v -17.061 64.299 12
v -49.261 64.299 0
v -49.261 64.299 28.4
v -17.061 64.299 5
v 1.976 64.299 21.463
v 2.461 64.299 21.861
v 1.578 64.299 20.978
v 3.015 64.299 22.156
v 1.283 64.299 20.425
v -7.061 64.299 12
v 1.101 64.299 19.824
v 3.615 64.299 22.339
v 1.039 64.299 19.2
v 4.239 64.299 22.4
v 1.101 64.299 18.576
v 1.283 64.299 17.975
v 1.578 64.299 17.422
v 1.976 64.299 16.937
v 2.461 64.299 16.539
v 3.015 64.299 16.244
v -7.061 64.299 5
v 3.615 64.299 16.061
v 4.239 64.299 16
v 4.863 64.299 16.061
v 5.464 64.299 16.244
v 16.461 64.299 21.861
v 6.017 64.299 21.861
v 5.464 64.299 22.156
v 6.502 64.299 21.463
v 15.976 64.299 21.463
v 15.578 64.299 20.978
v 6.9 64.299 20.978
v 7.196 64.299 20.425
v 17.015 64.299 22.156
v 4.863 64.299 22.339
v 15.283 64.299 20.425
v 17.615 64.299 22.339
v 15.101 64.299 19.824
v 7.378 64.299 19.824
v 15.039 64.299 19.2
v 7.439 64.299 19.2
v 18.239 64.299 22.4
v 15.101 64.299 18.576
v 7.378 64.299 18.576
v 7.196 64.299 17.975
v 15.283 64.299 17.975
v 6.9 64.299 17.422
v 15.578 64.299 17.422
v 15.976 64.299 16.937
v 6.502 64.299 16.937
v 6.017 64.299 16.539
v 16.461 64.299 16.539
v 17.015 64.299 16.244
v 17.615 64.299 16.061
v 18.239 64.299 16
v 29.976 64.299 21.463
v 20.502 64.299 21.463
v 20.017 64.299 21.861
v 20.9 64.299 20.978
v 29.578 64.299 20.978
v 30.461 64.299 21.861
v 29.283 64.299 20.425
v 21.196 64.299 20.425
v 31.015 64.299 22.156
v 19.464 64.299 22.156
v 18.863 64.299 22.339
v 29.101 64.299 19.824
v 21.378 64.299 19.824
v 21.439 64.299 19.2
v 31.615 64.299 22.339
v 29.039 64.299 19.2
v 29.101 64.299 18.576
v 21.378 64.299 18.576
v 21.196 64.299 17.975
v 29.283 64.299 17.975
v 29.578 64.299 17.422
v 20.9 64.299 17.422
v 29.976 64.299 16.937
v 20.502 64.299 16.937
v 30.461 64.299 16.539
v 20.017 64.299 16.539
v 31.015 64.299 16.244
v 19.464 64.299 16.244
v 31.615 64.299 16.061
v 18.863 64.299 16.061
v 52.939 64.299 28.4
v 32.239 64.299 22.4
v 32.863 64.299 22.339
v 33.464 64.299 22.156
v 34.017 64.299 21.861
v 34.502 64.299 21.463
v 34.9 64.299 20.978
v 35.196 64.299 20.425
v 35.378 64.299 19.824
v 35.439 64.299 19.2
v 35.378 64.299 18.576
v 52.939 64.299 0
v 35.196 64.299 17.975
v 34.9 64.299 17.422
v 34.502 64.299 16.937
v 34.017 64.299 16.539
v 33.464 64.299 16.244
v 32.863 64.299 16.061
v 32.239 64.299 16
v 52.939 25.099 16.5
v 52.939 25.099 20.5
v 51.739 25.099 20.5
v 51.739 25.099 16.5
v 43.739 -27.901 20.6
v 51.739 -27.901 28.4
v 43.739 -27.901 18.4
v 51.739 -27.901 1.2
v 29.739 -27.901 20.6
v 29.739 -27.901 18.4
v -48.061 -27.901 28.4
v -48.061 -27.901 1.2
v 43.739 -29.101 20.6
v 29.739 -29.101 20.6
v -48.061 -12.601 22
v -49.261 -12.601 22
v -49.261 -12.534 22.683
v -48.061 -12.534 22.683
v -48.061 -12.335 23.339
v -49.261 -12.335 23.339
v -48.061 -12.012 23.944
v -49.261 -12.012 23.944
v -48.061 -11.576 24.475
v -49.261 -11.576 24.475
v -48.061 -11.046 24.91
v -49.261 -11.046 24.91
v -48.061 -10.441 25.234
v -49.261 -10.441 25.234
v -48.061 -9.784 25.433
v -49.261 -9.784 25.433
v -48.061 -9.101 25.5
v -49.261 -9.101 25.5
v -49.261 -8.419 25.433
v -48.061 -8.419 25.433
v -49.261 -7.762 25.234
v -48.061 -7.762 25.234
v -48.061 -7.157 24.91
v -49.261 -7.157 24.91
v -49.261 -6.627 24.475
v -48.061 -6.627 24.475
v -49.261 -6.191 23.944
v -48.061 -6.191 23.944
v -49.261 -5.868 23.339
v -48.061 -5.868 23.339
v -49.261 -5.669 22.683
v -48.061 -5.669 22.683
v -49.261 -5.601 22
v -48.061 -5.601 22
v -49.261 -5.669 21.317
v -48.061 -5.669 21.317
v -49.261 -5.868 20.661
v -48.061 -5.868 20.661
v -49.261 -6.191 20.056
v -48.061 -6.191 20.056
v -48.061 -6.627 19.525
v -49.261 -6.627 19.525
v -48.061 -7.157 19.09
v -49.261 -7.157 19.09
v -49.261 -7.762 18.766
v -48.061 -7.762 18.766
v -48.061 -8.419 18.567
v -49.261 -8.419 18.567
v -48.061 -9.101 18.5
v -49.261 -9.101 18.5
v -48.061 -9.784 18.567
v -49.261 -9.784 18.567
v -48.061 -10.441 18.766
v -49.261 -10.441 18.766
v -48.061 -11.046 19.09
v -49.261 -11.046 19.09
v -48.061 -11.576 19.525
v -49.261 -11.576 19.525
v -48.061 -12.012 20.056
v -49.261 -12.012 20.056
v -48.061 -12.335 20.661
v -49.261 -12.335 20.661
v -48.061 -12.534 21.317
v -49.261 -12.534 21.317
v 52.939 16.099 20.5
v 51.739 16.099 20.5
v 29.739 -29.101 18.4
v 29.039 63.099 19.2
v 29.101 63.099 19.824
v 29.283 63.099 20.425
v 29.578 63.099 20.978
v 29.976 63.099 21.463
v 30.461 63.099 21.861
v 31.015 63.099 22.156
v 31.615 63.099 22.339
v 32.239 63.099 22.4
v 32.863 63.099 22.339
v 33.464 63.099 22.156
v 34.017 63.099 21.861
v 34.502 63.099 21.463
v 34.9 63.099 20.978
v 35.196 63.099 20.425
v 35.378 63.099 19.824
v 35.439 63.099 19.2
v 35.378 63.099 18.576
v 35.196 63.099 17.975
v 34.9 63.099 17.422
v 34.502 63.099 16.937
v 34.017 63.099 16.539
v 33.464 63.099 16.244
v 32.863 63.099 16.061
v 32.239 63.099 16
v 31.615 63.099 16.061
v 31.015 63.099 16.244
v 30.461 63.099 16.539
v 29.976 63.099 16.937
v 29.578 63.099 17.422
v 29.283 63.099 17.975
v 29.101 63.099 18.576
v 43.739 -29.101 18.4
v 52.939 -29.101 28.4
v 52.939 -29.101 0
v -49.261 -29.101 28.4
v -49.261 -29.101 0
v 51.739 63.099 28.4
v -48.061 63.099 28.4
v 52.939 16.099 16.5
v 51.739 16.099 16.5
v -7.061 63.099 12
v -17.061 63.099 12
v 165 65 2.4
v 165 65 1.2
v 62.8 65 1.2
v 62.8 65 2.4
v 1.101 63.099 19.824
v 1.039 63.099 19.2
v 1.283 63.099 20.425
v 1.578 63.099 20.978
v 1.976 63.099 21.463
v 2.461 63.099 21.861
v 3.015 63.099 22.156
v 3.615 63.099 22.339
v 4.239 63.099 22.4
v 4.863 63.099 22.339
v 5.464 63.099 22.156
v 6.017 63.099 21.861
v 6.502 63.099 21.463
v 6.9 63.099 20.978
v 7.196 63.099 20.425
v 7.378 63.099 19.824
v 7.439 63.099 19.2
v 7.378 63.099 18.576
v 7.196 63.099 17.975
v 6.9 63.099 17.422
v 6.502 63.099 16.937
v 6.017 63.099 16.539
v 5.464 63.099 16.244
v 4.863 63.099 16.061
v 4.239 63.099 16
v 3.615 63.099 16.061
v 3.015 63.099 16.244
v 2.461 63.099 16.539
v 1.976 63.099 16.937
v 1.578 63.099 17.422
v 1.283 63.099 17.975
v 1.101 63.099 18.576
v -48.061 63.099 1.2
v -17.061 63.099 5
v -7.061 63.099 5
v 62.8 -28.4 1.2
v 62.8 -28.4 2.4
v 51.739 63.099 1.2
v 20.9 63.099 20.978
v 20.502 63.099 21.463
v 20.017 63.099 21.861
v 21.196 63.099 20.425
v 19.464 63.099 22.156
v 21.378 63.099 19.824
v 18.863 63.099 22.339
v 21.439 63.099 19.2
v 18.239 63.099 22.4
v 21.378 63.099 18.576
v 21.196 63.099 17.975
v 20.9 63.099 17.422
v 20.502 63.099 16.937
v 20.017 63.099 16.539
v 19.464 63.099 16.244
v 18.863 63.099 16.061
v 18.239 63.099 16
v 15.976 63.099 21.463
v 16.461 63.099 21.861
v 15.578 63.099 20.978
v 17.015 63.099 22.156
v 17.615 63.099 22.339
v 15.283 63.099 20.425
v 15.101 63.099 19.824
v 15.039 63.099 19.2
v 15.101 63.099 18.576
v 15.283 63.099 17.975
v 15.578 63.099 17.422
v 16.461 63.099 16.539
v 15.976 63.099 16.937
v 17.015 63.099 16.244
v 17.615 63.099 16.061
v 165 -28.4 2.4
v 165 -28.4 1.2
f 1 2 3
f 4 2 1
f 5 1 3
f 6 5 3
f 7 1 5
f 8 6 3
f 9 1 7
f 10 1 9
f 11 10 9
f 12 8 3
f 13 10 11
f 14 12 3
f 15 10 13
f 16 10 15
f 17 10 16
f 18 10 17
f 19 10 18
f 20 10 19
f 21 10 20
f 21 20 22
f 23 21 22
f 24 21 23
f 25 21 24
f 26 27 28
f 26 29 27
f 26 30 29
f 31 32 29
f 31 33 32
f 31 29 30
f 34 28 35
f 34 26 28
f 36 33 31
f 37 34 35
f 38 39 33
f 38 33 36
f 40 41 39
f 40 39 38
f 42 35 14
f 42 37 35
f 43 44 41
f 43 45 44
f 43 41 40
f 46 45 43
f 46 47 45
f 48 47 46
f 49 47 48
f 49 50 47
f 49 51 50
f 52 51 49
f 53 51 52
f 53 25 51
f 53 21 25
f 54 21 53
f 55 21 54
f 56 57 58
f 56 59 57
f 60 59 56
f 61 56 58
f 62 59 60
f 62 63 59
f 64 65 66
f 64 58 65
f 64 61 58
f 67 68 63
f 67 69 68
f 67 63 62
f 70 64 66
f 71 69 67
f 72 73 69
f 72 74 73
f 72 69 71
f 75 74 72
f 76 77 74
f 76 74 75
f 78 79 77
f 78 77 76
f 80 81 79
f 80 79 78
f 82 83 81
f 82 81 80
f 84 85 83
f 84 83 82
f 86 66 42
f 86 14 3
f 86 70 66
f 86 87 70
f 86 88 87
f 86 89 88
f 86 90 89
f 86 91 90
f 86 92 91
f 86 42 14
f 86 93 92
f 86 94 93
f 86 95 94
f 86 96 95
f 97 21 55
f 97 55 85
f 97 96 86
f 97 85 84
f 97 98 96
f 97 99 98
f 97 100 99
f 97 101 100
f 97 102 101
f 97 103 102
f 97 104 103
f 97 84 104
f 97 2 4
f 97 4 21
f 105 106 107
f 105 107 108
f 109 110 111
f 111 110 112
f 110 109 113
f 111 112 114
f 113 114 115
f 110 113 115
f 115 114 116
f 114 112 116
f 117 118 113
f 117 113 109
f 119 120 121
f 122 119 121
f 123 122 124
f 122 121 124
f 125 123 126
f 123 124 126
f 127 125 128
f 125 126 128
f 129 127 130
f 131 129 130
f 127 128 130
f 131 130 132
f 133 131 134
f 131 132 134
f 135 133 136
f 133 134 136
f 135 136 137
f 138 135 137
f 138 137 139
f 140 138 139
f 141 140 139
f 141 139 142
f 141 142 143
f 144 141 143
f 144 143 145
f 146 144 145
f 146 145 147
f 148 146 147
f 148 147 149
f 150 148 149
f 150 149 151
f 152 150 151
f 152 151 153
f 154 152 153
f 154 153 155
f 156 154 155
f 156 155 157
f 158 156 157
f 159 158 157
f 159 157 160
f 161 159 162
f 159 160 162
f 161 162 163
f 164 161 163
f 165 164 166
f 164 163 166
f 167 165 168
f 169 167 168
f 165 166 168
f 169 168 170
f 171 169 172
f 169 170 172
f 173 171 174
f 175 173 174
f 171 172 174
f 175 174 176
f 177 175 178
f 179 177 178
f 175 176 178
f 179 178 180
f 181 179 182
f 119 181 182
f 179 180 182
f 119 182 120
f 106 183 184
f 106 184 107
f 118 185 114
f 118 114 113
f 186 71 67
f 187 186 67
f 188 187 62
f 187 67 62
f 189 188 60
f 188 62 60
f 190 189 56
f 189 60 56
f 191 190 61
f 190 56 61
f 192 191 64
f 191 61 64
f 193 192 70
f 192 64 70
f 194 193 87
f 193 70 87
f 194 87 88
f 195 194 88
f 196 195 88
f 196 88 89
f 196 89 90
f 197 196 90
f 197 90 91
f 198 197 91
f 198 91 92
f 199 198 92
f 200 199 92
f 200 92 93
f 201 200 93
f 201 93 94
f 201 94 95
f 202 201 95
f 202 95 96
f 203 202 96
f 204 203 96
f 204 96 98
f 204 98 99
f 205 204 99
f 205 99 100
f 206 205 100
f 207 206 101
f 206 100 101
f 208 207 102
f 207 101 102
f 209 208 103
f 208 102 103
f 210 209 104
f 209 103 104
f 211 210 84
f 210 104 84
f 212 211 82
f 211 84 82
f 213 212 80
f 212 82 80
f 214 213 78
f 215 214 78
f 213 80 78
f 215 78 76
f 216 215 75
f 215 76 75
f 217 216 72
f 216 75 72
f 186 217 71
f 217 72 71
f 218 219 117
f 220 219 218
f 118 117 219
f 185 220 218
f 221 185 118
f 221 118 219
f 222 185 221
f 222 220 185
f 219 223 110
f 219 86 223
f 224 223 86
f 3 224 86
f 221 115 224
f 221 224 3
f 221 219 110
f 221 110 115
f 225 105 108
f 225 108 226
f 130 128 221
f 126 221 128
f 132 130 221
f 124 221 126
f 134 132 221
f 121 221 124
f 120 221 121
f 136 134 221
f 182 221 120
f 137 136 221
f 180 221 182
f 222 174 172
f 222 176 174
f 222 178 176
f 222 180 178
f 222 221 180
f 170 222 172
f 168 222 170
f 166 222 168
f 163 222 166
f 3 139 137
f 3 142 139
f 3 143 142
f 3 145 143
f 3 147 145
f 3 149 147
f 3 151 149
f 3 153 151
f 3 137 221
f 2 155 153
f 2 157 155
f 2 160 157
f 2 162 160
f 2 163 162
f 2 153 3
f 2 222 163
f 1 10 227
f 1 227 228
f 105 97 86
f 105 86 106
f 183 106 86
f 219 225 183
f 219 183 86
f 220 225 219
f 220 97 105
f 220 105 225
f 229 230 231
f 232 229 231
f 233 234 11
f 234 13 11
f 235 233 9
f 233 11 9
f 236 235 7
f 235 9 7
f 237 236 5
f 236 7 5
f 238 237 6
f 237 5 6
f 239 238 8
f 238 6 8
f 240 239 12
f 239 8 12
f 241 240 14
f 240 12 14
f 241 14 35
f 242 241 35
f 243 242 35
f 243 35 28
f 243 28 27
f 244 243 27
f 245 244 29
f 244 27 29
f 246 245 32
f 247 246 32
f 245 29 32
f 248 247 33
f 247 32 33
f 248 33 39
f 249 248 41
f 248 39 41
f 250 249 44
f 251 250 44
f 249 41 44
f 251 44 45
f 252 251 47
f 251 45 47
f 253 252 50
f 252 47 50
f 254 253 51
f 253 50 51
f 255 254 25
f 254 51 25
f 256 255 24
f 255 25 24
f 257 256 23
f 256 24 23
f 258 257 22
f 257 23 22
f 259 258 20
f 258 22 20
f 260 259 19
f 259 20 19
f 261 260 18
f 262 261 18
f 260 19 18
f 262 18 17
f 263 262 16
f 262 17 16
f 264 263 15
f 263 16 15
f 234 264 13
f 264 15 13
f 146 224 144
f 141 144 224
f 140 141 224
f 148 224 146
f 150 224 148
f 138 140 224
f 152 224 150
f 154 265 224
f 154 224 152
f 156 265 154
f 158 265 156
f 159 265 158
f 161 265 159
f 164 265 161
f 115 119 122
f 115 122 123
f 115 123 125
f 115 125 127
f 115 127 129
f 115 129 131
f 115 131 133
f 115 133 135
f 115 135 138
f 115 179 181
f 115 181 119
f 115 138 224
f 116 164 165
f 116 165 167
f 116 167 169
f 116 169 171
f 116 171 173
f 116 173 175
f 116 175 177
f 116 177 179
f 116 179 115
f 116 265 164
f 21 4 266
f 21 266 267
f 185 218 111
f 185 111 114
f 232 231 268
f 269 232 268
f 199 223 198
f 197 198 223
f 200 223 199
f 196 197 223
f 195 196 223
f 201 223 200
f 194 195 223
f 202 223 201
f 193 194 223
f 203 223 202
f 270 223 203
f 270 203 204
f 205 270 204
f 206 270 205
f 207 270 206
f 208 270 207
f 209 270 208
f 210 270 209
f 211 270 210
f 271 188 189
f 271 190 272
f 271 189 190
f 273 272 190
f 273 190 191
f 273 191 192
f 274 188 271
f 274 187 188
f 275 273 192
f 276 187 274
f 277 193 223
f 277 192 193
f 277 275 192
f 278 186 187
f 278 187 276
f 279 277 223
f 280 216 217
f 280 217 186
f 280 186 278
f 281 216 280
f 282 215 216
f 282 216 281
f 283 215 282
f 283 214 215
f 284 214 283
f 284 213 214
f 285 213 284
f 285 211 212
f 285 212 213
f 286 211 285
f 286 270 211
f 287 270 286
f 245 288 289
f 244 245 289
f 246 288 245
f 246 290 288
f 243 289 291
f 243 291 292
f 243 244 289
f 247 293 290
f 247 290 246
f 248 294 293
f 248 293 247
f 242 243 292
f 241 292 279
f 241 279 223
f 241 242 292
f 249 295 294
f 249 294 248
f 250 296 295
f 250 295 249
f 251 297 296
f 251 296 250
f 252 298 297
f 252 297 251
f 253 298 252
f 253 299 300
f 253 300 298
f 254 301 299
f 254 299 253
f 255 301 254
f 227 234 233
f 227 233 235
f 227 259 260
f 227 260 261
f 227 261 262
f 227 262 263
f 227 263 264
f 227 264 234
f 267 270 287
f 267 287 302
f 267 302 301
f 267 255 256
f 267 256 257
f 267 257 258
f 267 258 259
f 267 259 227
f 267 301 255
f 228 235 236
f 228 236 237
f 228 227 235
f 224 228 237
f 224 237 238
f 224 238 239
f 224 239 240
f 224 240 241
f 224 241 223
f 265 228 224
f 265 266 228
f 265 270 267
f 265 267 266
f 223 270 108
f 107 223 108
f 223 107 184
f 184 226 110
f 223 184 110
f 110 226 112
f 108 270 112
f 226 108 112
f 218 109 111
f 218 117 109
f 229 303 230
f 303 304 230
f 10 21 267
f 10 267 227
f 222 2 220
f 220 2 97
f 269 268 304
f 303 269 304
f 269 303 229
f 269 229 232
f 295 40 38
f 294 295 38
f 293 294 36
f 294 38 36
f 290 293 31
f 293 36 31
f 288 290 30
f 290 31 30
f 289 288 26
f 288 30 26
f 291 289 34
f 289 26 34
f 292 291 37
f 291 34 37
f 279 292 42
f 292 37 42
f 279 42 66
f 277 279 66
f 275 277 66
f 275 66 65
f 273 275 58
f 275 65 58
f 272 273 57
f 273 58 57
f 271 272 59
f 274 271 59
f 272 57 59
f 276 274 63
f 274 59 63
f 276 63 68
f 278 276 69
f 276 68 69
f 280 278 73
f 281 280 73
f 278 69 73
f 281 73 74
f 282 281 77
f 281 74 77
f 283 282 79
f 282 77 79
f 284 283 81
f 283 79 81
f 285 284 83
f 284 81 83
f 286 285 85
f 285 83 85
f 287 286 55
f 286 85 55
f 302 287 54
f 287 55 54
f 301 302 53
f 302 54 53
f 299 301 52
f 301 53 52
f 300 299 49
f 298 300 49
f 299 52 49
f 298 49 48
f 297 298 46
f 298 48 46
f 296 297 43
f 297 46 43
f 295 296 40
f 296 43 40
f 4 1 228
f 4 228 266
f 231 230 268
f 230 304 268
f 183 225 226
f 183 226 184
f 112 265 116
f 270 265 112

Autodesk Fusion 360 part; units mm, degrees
sketch "Sketch1" plane through (0, 0, 0) normal (0, 0, 1) x (1, 0, 0)
  line L0 (-49.2609, 64.2986) -> (52.9391, 64.2986)
  line L1 (52.9391, 64.2986) -> (52.9391, -29.1014)
  line L2 (52.9391, -29.1014) -> (-49.2609, -29.1014)
  line L3 (-49.2609, -29.1014) -> (-49.2609, 64.2986)
  dimension "d1" = 102.2
  dimension "d2" = 93.4
extrude "Extrude1" add sketch "Sketch1" along normal blind 1.2 makes body 1
sketch "Sketch2" plane through (0, 0, 1.2) normal (0, 0, 1) x (-1, 0, 0)
  line L0 (49.2609, 29.1014) -> (-52.9391, 29.1014)
  line L1 (-52.9391, 29.1014) -> (-52.9391, -64.2986)
  line L2 (-52.9391, -64.2986) -> (49.2609, -64.2986)
  line L3 (49.2609, -64.2986) -> (49.2609, 29.1014)
  line L4 (49.2609, -64.2986) -> (-52.9391, -64.2986)
  line L5 (-52.9391, -64.2986) -> (-52.9391, -63.0986)
  line L6 (-52.9391, -63.0986) -> (49.2609, -63.0986)
  line L7 (49.2609, -63.0986) -> (49.2609, -64.2986)
  line L8 (49.2609, -64.2986) -> (48.0609, -64.2986)
  line L9 (48.0609, -64.2986) -> (48.0609, 29.1014)
  line L10 (48.0609, 29.1014) -> (49.2609, 29.1014)
  line L11 (49.2609, 29.1014) -> (49.2609, -64.2986)
  line L12 (-52.9391, -64.2986) -> (-51.7391, -64.2986)
  line L13 (-51.7391, -64.2986) -> (-51.7391, 29.1014)
  line L14 (-51.7391, 29.1014) -> (-52.9391, 29.1014)
  line L15 (-52.9391, 29.1014) -> (-52.9391, -64.2986)
  line L16 (49.2609, 29.1014) -> (-52.9391, 29.1014)
  line L17 (-52.9391, 29.1014) -> (-52.9391, 27.9014)
  line L18 (-52.9391, 27.9014) -> (49.2609, 27.9014)
  line L19 (49.2609, 27.9014) -> (49.2609, 29.1014)
  dimension "d5" = 1.2
  dimension "d6" = 1.2
  dimension "d7" = 1.2
  dimension "d8" = 1.2
extrude "Extrude2" add sketch "Sketch2" along normal blind 27.2 contours L0 L3 L9 L10 L11 L16 L18 L19 | L0 L9 L13 L16 L18 | L3 L6 L9 L11 L18 | L0 L1 L13 L14 L15 L16 L17 L18 | L2 L3 L4 L6 L7 L8 L9 L11 | L1 L6 L13 L15 L18 | L2 L4 L6 L9 L13 | L1 L2 L4 L5 L6 L12 L13 L15 bodies 1
sketch "Sketch3" plane through (0, 0, 1.2) normal (0, 0, 1) x (-1, 0, 0)
  line L0 (48.0609, 27.9014) -> (-51.7391, 27.9014)
  line L1 (-51.7391, 27.9014) -> (-51.7391, -63.0986)
  line L2 (-51.7391, -63.0986) -> (48.0609, -63.0986)
  line L3 (48.0609, -63.0986) -> (48.0609, 27.9014)
  line L4 (-165, -65) -> (-62.8, -65)
  line L5 (-62.8, -65) -> (-62.8, 28.4)
  line L6 (-62.8, 28.4) -> (-165, 28.4)
  line L7 (-165, 28.4) -> (-165, -65)
  dimension "d11" = 102.2
  dimension "d12" = 93.4
extrude "Extrude3" add sketch "Sketch3" along normal blind 1.2 separate body contours L4 L5 L6 L7 makes body 2
sketch "Sketch4" plane through (0, -29.1014, 0) normal (0, -1, 0) x (1, 0, 0)
  line L0 (-49.2609, 0) -> (52.9391, 0)
  line L1 (52.9391, 0) -> (52.9391, 28.4)
  line L2 (52.9391, 28.4) -> (-49.2609, 28.4)
  line L3 (-49.2609, 28.4) -> (-49.2609, 0)
  line L4 (29.7391, 20.6) -> (43.7391, 20.6)
  line L5 (43.7391, 20.6) -> (43.7391, 18.4)
  line L6 (43.7391, 18.4) -> (29.7391, 18.4)
  line L7 (29.7391, 18.4) -> (29.7391, 20.6)
  dimension "d15" = 18.4
  dimension "d16" = 9.2
  dimension "d17" = 14
  dimension "d18" = 2.2
extrude "Extrude4" cut sketch "Sketch4" against normal blind 4 contours L4 L5 L6 L7 bodies 1
sketch "Sketch5" plane through (0, 64.2986, 0) normal (0, 1, 0) x (-1, 0, 0)
  line L0 (-52.9391, 0) -> (49.2609, 0)
  line L1 (49.2609, 0) -> (49.2609, 28.4)
  line L2 (49.2609, 28.4) -> (-52.9391, 28.4)
  line L3 (-52.9391, 28.4) -> (-52.9391, 0)
  circle A0 centre (-32.2391, 19.2) radius 3.2
  line L4 (-51.7391, 1.2) -> (-51.7391, 28.4)
  line L5 (7.0609, 12) -> (17.0609, 12)
  line L6 (17.0609, 12) -> (17.0609, 5)
  line L7 (17.0609, 5) -> (7.0609, 5)
  line L8 (7.0609, 5) -> (7.0609, 12)
  circle A1 centre (-18.2391, 19.2) radius 3.2
  circle A2 centre (-4.2391, 19.2) radius 3.2
  dimension "d21" = 6.4
  dimension "d22" = 19.2
  dimension "d26" = 10
  dimension "d27" = 7
  dimension "d28" = 32.2
  dimension "d30" = 5
  dimension "d44" = 20.7
  dimension "d45" = 6.4
  dimension "d46" = 6.4
extrude "Extrude5" cut sketch "Sketch5" against normal blind 4 contours A0 | L5 L6 L7 L8 | A1 | A2 bodies 1
sketch "Sketch6" plane through (52.9391, 0, 0) normal (1, 0, 0) x (0, 1, 0)
  line L0 (-29.1014, 0) -> (64.2986, 0)
  line L1 (64.2986, 0) -> (64.2986, 28.4)
  line L2 (64.2986, 28.4) -> (-29.1014, 28.4)
  line L3 (-29.1014, 28.4) -> (-29.1014, 0)
  line L4 (16.0986, 20.5) -> (25.0986, 20.5)
  line L5 (25.0986, 20.5) -> (25.0986, 16.5)
  line L6 (25.0986, 16.5) -> (16.0986, 16.5)
  line L7 (16.0986, 16.5) -> (16.0986, 20.5)
  dimension "d33" = 4
  dimension "d34" = 9
  dimension "d35" = 16.5
  dimension "d36" = 39.2
extrude "Extrude6" cut sketch "Sketch6" against normal blind 2 contours L4 L5 L6 L7 bodies 1
sketch "Sketch7" plane through (-49.2609, 0, 0) normal (-1, 0, 0) x (0, -1, 0)
  line L0 (-64.2986, 0) -> (29.1014, 0)
  line L1 (29.1014, 0) -> (29.1014, 28.4)
  line L2 (29.1014, 28.4) -> (-64.2986, 28.4)
  line L3 (-64.2986, 28.4) -> (-64.2986, 0)
  circle A0 centre (9.1014, 22) radius 3.5
  dimension "d39" = 7
  dimension "d40" = 20
  dimension "d41" = 22
extrude "Extrude7" cut sketch "Sketch7" against normal blind 3 contours A0 bodies 1
equation "d1 = 97.8 mm + 2.4 mm + 2 mm"
equation "d2 = 89 mm + 2.4 mm + 2 mm"
equation "d9 = 30 mm - 2.8 mm"
equation "d15 = 13 mm + 1.4 mm + 4 mm"
equation "d16 = 7 mm + 1 mm + 1.2 mm"
equation "d22 = 14 mm + 4 mm + 1.2 mm"
equation "d28 = 30 mm + 1 mm + 1.2 mm"
equation "d30 = 3.8 mm + 1.2 mm"
equation "d35 = 11.3 mm + 4 mm + 1.2 mm"
equation "d36 = 37 mm + 1.2 mm + 1 mm"
equation "d44 = 18.5 mm + 1 mm + 1.2 mm"
